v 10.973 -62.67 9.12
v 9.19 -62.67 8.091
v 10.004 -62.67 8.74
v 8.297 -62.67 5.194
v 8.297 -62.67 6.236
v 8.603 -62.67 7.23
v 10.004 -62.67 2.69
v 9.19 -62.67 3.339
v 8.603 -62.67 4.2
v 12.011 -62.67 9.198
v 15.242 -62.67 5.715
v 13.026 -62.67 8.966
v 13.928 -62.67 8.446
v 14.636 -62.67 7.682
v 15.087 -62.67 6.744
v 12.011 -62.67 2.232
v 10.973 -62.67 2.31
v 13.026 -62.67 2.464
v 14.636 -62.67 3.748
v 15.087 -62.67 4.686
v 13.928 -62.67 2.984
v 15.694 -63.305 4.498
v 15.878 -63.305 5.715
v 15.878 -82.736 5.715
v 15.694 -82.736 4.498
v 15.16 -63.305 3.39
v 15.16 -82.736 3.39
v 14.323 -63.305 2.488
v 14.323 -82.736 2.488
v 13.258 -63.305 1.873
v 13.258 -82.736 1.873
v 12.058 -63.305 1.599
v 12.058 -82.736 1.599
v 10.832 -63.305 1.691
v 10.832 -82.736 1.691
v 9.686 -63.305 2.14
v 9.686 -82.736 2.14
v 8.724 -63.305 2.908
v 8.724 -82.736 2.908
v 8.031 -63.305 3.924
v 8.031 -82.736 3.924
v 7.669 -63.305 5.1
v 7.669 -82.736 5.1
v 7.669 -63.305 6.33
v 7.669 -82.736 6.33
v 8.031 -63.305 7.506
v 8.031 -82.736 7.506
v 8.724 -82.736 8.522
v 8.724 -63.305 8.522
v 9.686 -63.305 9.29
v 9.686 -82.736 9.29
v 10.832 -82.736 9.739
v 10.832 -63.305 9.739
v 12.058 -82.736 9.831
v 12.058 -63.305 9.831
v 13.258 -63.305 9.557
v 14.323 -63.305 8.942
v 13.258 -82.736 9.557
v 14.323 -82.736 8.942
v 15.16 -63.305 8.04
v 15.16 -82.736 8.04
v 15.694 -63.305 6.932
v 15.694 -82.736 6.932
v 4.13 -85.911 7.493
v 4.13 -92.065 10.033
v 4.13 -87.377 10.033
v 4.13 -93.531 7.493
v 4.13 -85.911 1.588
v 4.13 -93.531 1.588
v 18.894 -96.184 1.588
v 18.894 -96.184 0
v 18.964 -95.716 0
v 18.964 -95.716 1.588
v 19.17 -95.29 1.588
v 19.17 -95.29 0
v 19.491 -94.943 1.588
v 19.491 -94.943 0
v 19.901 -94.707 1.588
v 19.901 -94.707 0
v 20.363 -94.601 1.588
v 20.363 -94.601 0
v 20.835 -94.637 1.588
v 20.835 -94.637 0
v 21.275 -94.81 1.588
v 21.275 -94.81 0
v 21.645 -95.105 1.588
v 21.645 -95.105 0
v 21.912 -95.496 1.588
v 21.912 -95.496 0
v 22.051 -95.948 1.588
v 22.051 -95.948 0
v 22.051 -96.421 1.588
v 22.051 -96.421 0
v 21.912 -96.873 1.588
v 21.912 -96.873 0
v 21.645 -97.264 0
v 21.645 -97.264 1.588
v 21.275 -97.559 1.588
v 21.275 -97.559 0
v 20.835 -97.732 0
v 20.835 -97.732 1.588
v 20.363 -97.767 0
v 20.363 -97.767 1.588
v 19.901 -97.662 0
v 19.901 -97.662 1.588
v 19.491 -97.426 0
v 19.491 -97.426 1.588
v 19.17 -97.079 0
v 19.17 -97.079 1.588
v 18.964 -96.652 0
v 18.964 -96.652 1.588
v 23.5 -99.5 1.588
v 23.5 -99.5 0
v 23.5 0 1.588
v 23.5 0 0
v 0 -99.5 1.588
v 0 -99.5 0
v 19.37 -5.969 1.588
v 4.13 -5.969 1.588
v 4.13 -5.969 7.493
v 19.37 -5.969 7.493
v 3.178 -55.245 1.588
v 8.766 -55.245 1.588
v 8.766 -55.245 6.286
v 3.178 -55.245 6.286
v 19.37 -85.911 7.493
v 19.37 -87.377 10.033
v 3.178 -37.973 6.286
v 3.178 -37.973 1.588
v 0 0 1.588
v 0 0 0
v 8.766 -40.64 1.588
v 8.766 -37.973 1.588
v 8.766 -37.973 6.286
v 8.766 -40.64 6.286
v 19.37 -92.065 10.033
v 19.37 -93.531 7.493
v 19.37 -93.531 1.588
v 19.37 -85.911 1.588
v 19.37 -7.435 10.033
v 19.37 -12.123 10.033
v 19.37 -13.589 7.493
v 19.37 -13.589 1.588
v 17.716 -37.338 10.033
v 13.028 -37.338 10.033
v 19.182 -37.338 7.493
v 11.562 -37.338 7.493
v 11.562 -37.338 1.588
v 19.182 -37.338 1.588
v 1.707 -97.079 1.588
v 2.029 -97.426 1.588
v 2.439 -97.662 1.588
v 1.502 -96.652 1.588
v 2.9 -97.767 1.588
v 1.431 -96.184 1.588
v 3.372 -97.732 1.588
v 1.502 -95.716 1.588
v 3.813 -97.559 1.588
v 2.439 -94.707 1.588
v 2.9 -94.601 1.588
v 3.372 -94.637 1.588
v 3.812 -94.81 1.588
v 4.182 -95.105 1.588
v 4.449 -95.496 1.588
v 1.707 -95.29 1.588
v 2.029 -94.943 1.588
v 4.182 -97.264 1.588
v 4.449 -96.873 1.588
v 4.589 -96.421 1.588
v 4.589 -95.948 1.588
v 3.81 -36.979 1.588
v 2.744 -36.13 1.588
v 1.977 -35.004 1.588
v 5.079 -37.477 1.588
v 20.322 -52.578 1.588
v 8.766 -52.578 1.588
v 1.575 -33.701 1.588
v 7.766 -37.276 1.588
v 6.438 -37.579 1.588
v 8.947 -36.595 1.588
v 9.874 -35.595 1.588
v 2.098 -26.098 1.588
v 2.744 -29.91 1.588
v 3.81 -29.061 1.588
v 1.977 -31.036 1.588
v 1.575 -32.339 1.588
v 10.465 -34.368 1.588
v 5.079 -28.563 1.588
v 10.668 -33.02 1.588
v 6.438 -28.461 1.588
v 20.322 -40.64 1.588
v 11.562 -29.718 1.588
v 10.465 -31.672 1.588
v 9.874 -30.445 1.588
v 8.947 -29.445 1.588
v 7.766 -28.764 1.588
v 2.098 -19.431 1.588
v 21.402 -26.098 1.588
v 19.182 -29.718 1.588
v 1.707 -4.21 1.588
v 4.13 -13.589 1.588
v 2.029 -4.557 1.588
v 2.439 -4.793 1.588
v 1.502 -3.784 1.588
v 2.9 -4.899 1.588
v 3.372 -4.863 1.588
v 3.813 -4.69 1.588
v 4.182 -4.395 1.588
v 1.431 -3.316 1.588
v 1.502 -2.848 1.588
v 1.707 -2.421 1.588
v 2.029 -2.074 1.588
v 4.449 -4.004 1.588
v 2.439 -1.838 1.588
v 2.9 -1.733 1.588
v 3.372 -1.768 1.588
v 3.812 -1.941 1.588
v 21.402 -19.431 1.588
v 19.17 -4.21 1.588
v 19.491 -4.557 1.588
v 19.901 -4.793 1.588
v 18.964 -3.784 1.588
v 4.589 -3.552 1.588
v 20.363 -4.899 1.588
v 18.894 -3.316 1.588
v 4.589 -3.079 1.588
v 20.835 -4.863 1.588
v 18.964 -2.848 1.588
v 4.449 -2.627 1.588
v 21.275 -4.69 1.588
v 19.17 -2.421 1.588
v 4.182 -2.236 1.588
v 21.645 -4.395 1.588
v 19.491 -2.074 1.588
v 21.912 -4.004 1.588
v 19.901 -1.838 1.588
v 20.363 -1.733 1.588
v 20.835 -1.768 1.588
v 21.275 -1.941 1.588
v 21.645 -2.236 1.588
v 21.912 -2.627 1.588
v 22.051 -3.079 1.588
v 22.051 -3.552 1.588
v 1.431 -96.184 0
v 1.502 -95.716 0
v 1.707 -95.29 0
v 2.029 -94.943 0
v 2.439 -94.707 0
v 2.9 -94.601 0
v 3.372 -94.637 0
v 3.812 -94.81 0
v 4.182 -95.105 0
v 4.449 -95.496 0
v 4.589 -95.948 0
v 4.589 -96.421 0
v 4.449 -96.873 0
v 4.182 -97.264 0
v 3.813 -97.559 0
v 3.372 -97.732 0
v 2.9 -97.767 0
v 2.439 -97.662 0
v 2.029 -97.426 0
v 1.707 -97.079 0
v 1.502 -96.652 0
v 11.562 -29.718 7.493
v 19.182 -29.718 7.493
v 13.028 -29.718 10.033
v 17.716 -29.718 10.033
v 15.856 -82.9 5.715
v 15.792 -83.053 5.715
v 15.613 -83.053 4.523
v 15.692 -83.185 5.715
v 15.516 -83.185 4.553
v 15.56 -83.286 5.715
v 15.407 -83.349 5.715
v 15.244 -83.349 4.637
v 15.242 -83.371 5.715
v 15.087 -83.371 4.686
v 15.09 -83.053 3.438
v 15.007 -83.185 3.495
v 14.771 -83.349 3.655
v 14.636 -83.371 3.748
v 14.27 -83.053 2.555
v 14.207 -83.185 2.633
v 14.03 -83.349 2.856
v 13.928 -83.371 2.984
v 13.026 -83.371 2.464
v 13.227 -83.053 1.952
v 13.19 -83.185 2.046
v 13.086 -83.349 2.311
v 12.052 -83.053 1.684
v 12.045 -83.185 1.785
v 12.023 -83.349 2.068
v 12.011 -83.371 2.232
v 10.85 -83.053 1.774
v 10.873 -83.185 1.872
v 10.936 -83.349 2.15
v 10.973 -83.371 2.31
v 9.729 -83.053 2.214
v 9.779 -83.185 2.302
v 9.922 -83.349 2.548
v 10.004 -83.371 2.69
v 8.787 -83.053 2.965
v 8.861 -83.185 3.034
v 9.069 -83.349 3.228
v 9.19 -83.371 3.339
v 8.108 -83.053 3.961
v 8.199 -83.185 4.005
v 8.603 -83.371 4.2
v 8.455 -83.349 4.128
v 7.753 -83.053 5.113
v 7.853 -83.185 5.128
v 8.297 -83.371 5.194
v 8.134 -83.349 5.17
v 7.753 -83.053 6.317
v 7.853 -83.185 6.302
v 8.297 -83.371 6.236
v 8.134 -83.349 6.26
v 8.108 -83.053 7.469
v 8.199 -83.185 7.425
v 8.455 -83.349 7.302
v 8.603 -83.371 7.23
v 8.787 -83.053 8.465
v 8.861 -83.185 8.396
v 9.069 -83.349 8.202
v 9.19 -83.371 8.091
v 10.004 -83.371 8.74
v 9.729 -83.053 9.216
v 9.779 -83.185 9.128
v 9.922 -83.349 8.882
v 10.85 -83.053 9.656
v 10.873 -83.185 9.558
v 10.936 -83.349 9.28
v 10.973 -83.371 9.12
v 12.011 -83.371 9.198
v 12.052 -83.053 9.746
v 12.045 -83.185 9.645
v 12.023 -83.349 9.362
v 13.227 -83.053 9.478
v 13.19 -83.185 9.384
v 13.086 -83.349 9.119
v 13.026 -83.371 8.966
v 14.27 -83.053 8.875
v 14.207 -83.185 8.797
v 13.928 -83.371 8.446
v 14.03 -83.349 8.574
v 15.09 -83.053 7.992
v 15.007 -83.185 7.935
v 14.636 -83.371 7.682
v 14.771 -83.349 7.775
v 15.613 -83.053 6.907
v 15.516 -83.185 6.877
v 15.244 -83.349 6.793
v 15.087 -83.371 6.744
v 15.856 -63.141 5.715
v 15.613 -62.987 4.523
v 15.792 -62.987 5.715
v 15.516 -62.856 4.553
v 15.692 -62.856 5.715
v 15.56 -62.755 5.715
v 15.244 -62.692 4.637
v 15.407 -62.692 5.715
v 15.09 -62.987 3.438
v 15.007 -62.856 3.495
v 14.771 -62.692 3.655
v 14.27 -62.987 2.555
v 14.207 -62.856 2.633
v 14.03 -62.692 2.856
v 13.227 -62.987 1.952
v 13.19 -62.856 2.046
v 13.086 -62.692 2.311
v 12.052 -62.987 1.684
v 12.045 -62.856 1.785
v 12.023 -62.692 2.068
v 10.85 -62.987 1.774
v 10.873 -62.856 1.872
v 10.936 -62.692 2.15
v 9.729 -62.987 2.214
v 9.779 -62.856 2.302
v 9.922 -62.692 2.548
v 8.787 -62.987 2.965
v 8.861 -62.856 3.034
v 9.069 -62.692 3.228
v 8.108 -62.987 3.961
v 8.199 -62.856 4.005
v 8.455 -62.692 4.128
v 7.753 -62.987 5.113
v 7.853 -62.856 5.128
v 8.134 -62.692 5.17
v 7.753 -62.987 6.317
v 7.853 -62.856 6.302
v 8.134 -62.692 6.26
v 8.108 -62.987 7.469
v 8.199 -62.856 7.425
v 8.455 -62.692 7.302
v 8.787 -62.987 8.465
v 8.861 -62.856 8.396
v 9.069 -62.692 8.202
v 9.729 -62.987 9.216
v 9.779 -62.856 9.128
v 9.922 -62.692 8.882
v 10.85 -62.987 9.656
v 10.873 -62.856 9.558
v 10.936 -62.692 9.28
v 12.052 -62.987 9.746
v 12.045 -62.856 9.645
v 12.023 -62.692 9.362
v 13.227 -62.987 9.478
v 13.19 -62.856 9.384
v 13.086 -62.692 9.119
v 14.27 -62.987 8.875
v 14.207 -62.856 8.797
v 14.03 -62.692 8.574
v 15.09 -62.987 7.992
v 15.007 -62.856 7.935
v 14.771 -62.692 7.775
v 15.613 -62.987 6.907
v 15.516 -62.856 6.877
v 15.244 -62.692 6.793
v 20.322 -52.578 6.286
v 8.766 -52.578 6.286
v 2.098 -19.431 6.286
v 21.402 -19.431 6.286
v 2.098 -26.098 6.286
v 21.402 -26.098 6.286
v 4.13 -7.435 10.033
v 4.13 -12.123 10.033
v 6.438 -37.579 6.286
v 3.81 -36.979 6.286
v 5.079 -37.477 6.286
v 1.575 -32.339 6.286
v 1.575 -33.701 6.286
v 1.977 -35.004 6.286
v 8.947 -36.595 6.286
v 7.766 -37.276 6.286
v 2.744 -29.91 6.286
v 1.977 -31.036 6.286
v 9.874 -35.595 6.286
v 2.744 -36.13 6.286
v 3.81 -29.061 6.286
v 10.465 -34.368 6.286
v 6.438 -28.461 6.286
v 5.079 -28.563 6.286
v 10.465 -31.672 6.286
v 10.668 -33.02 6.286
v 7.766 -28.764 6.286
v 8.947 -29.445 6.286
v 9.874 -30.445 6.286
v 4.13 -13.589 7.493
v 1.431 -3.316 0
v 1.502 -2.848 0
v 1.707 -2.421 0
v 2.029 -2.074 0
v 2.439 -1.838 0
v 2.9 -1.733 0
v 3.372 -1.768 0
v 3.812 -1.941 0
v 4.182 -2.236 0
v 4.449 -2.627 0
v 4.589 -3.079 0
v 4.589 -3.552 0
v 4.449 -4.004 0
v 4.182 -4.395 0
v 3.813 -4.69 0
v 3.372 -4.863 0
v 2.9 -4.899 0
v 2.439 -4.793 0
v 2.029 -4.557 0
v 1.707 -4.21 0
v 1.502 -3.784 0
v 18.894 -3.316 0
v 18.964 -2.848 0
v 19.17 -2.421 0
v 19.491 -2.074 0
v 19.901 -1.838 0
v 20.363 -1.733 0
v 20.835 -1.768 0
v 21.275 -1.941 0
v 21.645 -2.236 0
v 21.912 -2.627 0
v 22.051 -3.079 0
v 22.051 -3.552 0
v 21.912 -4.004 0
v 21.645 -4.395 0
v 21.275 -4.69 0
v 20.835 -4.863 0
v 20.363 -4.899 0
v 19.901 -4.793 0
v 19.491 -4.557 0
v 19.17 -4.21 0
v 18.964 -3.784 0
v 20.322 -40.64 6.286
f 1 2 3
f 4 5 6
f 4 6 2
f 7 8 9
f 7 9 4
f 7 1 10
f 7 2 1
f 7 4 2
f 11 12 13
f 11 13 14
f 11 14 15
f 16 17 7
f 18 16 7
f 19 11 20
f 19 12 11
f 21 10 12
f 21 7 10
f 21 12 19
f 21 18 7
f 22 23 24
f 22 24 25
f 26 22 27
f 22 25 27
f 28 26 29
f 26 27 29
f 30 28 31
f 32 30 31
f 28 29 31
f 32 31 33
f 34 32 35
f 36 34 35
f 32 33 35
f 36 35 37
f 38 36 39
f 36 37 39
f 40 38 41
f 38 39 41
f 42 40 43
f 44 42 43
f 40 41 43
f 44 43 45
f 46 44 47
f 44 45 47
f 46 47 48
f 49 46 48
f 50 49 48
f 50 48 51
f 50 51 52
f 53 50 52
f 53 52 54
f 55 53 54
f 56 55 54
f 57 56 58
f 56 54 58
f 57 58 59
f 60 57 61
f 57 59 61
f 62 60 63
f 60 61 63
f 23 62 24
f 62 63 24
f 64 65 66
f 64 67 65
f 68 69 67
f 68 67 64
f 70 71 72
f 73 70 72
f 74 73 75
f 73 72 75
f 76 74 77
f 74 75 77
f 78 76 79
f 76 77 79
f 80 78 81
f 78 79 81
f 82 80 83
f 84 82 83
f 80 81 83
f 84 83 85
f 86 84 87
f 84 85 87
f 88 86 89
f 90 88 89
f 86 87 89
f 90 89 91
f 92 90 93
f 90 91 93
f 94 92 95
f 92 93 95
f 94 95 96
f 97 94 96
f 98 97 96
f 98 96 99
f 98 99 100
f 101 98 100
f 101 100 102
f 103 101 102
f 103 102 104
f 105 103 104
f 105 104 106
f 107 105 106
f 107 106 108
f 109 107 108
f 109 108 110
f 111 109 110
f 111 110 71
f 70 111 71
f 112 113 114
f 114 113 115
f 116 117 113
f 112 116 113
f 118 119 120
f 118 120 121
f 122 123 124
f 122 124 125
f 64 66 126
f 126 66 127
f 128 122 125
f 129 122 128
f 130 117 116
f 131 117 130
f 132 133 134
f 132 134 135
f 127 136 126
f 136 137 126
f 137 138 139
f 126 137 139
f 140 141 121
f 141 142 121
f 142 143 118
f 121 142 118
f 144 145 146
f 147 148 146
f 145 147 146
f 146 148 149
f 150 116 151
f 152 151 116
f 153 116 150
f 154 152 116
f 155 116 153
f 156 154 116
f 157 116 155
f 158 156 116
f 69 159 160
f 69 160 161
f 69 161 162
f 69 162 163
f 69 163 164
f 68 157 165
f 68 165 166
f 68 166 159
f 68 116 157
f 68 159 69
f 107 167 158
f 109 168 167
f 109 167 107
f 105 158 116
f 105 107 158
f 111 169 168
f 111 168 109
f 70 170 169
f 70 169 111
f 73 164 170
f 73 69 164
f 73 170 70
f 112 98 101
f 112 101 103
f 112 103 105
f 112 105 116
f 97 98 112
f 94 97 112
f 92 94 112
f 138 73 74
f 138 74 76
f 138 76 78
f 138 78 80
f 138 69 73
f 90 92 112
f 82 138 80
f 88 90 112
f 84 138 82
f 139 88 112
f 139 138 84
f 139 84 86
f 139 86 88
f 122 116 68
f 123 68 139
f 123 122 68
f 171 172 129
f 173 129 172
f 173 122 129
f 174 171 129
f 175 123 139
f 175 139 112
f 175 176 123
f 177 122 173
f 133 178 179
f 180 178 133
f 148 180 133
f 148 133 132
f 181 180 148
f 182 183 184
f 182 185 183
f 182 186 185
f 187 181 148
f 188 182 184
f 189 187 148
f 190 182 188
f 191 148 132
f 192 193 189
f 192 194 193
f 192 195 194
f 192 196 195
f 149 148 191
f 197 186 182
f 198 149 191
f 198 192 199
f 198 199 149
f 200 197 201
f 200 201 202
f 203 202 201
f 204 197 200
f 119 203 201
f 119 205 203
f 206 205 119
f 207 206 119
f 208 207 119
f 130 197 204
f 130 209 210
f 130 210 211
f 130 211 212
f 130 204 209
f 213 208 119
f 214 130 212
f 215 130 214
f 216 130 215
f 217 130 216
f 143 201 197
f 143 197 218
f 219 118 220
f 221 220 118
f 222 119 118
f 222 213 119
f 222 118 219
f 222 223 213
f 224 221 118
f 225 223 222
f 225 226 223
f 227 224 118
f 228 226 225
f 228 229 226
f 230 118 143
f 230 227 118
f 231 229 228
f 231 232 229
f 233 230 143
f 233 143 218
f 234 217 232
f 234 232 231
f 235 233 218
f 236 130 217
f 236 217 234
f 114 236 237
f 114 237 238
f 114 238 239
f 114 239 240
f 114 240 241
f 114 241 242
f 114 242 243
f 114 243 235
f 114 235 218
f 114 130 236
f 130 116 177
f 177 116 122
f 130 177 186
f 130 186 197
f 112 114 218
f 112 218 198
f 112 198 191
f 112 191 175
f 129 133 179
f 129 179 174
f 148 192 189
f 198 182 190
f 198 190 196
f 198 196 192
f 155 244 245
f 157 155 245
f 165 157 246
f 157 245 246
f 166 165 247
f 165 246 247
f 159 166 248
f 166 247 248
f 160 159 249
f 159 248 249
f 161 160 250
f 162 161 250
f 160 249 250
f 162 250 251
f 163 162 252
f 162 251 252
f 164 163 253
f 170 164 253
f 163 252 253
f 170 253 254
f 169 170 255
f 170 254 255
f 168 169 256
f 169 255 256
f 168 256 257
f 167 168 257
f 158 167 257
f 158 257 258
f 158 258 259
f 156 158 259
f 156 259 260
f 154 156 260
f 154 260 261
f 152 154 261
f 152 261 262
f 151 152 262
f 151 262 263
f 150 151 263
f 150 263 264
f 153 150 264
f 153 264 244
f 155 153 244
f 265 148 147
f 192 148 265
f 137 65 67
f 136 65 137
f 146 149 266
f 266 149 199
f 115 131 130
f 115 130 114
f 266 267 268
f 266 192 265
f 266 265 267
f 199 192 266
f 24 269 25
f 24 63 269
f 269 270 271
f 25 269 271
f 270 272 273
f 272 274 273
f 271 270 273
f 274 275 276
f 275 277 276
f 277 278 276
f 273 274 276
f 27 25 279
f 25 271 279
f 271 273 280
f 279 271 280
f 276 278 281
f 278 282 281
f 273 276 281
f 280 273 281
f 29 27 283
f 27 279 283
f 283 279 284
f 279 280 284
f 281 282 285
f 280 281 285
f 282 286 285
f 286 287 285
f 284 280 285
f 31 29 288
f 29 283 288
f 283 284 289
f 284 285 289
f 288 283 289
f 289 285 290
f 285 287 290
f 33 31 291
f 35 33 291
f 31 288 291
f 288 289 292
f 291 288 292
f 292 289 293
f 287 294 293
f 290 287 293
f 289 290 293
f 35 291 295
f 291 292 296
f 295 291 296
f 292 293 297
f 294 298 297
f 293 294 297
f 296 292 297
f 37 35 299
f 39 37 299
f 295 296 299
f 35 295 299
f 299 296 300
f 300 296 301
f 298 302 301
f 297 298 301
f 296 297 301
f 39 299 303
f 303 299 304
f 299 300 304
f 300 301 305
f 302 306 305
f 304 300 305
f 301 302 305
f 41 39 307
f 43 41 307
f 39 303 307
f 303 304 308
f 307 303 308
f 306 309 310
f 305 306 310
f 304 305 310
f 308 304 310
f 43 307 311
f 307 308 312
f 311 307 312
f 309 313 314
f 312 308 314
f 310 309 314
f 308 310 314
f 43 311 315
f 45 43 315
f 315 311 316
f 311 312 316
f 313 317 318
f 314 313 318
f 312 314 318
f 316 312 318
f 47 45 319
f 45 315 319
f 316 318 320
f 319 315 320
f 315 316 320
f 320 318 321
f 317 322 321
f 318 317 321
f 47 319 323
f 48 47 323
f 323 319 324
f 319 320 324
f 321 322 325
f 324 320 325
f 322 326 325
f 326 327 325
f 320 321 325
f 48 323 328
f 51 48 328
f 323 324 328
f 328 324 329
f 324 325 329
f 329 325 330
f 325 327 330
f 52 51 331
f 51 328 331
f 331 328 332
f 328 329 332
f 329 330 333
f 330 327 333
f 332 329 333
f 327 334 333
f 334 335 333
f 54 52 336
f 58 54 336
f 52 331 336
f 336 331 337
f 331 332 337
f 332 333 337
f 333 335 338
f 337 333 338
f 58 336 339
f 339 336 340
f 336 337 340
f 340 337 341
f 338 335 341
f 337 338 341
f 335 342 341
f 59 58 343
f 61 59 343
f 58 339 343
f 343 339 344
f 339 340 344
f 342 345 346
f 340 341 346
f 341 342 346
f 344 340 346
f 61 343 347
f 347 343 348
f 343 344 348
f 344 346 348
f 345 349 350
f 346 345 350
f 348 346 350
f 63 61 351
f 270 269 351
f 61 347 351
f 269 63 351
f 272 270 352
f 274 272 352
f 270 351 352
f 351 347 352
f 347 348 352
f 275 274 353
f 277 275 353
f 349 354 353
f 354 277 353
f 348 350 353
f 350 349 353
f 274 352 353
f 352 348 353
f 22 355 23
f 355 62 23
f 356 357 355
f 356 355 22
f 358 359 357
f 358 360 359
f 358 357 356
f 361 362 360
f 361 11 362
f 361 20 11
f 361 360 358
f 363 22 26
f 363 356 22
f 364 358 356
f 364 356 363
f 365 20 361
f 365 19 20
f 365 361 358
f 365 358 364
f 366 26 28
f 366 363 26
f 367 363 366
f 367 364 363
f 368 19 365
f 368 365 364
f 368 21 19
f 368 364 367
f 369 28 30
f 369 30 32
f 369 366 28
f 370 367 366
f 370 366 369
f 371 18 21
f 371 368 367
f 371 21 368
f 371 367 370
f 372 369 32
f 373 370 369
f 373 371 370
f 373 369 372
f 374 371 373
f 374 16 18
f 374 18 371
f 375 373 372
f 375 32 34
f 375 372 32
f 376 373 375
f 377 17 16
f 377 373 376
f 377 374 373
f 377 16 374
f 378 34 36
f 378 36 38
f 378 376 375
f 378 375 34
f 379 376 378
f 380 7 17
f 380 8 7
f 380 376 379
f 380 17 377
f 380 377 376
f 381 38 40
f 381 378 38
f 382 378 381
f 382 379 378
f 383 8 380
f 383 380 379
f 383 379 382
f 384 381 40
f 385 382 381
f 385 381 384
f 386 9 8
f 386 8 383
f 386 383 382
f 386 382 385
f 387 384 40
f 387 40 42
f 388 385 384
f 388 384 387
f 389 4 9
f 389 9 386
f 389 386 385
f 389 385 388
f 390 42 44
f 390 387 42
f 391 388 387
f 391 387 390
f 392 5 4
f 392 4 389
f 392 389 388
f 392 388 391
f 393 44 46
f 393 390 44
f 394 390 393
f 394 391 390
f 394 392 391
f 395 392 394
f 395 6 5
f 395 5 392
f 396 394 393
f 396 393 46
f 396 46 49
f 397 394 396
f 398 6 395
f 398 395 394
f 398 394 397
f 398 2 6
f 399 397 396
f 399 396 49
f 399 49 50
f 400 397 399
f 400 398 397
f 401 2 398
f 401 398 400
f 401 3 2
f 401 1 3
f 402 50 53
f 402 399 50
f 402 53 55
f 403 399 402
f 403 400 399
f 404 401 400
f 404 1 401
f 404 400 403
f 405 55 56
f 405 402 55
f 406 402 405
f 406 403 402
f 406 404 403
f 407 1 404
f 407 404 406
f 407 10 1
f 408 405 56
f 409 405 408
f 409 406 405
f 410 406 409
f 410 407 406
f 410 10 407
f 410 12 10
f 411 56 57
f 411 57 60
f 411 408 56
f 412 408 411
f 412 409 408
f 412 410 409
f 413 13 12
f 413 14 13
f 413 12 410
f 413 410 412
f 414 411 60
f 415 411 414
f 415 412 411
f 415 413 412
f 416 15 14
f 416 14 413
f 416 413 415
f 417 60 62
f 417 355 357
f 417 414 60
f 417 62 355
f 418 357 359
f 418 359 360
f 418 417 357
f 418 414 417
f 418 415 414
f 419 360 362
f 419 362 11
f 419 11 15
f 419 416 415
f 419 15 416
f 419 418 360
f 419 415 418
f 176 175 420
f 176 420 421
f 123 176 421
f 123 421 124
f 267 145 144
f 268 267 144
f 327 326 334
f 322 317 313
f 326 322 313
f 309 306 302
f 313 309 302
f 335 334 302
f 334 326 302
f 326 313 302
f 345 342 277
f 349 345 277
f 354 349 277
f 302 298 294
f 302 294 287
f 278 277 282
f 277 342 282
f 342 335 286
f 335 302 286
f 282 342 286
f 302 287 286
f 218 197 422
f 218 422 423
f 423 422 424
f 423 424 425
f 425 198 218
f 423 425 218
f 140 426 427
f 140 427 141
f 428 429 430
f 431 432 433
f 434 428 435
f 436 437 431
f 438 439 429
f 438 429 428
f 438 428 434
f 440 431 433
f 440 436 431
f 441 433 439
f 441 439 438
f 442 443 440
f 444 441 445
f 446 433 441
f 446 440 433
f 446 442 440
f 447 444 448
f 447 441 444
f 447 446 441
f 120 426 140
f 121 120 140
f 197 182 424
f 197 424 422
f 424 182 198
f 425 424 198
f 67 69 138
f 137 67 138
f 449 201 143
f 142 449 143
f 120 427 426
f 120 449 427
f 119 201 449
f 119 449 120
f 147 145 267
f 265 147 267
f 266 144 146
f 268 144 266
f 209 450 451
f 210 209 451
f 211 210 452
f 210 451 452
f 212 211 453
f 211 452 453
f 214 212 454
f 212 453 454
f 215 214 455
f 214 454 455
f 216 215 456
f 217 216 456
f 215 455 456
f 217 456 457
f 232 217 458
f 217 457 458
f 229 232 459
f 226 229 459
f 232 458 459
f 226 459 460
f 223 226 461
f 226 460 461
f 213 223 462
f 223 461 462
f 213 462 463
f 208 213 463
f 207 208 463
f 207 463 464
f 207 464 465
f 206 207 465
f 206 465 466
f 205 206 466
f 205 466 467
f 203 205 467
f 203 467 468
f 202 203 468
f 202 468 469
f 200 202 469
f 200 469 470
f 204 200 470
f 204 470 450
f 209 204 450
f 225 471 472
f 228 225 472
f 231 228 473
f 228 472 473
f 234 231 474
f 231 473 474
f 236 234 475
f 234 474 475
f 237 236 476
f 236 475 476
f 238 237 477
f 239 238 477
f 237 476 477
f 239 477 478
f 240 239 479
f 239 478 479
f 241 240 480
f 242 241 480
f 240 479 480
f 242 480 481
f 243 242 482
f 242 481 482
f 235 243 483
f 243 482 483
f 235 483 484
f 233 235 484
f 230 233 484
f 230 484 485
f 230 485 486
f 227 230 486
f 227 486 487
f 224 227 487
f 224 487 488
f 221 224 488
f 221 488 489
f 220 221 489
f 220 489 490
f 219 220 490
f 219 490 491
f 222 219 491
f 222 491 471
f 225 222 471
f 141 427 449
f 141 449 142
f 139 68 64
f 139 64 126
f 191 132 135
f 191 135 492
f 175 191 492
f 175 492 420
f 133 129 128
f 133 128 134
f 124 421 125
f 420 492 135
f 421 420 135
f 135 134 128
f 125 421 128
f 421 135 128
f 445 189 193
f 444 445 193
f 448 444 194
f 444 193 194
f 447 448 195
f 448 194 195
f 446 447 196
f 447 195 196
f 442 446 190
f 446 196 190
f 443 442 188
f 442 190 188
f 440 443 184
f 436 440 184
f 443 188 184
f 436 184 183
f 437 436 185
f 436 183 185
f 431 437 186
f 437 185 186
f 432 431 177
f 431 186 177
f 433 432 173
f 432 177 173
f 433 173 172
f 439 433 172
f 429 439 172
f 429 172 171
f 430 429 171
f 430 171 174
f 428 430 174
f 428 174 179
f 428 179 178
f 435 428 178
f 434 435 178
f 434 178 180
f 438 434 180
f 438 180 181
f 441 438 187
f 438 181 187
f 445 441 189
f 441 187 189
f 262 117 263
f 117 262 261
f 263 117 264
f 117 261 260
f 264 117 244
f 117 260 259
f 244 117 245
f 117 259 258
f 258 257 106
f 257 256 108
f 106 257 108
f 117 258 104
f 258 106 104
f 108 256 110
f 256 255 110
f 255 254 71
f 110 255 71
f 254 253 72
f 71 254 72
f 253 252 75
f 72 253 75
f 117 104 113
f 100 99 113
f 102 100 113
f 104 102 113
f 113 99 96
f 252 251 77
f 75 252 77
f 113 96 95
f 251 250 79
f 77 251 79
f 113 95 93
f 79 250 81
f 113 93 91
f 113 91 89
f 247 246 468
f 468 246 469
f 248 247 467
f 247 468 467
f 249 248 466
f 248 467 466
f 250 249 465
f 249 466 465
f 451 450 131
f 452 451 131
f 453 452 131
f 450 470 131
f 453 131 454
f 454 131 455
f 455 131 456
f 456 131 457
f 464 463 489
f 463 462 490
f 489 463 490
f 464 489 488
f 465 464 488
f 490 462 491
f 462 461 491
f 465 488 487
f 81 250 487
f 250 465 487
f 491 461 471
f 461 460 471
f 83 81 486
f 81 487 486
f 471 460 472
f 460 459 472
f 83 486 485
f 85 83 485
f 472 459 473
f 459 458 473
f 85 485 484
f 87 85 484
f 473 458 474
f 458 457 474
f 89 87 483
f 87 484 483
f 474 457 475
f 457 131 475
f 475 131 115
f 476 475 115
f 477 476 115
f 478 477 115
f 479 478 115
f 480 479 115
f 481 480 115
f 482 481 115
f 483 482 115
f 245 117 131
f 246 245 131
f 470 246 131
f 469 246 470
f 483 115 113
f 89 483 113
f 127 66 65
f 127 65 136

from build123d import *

# Parameters (mm, degrees)
SKETCH1_W             = 23.5
SKETCH1_H             = 99.5
BOSS_EXTRUDE1_DEPTH   = 1.5875
SKETCH2_R             = 1.5875
CUT_EXTRUDE1_DEPTH    = 2.5875
SKETCH5_W             = 15.24
SKETCH5_H             = 7.62
SKETCH5_W_2           = 7.62
BOSS_EXTRUDE2_DEPTH   = 8.4455
CHAMFER1_SIZE         = 2.54
CHAMFER1_SIZE2        = 1.466469684
CHAMFER1_PART_2_SIZE  = 2.54
CHAMFER1_PART_2_SIZE2 = 1.466469684
CHAMFER1_PART_3_SIZE  = 2.54
CHAMFER1_PART_3_SIZE2 = 1.466469684
CHAMFER1_PART_4_SIZE  = 2.54
CHAMFER1_PART_4_SIZE2 = 1.466469684
CHAMFER1_PART_5_SIZE  = 2.54
CHAMFER1_PART_5_SIZE2 = 1.466469684
CHAMFER1_PART_6_SIZE  = 2.54
CHAMFER1_PART_6_SIZE2 = 1.466469684
SKETCH6_R             = 4.1275
BOSS_EXTRUDE3_DEPTH   = 20.701
FILLET1_R             = 0.635
SKETCH7_R             = 4.572
SKETCH7_W             = 19.304
SKETCH7_H             = 6.6675
BOSS_EXTRUDE4_DEPTH   = 4.699


with BuildPart() as part:
    # Sketch1 → Boss-Extrude1 (new body)
    with BuildSketch(Plane.XY):
        with Locations((11.75, -49.75)):
            Rectangle(SKETCH1_W, SKETCH1_H)
    extrude(amount=BOSS_EXTRUDE1_DEPTH)

    # Sketch2 → Cut-Extrude1 (cut, through all)
    with BuildSketch(Plane(origin=(0, 0, 0), x_dir=(-1, 0, 0), z_dir=(0, 0, -1))):
        with Locations((-20.48125, -3.315625)):
            Circle(SKETCH2_R)
        with Locations((-3.01875, -3.315625)):
            Circle(SKETCH2_R)
        with Locations((-3.01875, -96.184375)):
            Circle(SKETCH2_R)
        with Locations((-20.48125, -96.184375)):
            Circle(SKETCH2_R)
    extrude(amount=-CUT_EXTRUDE1_DEPTH, mode=Mode.SUBTRACT)

    # Sketch5 → Boss-Extrude2 (add)
    with BuildSketch(Plane.XY.offset(1.5875)):
        with Locations((11.75, -9.779)):
            Rectangle(SKETCH5_W, SKETCH5_H)
        with Locations((15.372, -33.528)):
            Rectangle(SKETCH5_W_2, SKETCH5_H)
        with Locations((11.75, -89.721)):
            Rectangle(SKETCH5_W, SKETCH5_H)
    extrude(amount=BOSS_EXTRUDE2_DEPTH)

    # Chamfer1
    chamfer1_edges = [part.edges().sort_by_distance(p)[0] for p in [
        (11.75, -13.589, 10.033),
    ]]
    chamfer1_side = [part.faces().sort_by_distance(p)[0] for p in [
        (11.75, -13.589, 5.81025),
    ]]
    chamfer(chamfer1_edges, length=CHAMFER1_SIZE, length2=CHAMFER1_SIZE2, reference=chamfer1_side[0])

    # Chamfer1 part 2
    chamfer1_part_2_edges = [part.edges().sort_by_distance(p)[0] for p in [
        (11.75, -5.969, 10.033),
    ]]
    chamfer1_part_2_side = [part.faces().sort_by_distance(p)[0] for p in [
        (11.75, -5.969, 5.81025),
    ]]
    chamfer(chamfer1_part_2_edges, length=CHAMFER1_PART_2_SIZE, length2=CHAMFER1_PART_2_SIZE2, reference=chamfer1_part_2_side[0])

    # Chamfer1 part 3
    chamfer1_part_3_edges = [part.edges().sort_by_distance(p)[0] for p in [
        (11.562, -33.528, 10.033),
    ]]
    chamfer1_part_3_side = [part.faces().sort_by_distance(p)[0] for p in [
        (11.562, -33.528, 5.81025),
    ]]
    chamfer(chamfer1_part_3_edges, length=CHAMFER1_PART_3_SIZE, length2=CHAMFER1_PART_3_SIZE2, reference=chamfer1_part_3_side[0])

    # Chamfer1 part 4
    chamfer1_part_4_edges = [part.edges().sort_by_distance(p)[0] for p in [
        (19.182, -33.528, 10.033),
    ]]
    chamfer1_part_4_side = [part.faces().sort_by_distance(p)[0] for p in [
        (19.182, -33.528, 5.81025),
    ]]
    chamfer(chamfer1_part_4_edges, length=CHAMFER1_PART_4_SIZE, length2=CHAMFER1_PART_4_SIZE2, reference=chamfer1_part_4_side[0])

    # Chamfer1 part 5
    chamfer1_part_5_edges = [part.edges().sort_by_distance(p)[0] for p in [
        (11.75, -93.531, 10.033),
    ]]
    chamfer1_part_5_side = [part.faces().sort_by_distance(p)[0] for p in [
        (11.75, -93.531, 5.81025),
    ]]
    chamfer(chamfer1_part_5_edges, length=CHAMFER1_PART_5_SIZE, length2=CHAMFER1_PART_5_SIZE2, reference=chamfer1_part_5_side[0])

    # Chamfer1 part 6
    chamfer1_part_6_edges = [part.edges().sort_by_distance(p)[0] for p in [
        (11.75, -85.911, 10.033),
    ]]
    chamfer1_part_6_side = [part.faces().sort_by_distance(p)[0] for p in [
        (11.75, -85.911, 5.81025),
    ]]
    chamfer(chamfer1_part_6_edges, length=CHAMFER1_PART_6_SIZE, length2=CHAMFER1_PART_6_SIZE2, reference=chamfer1_part_6_side[0])

    # Sketch7 → Boss-Extrude4 (add)
    with BuildSketch(Plane.XY.offset(1.5875)):
        with Locations((6.096, -33.02)):
            Circle(SKETCH7_R)
        with Locations((11.75, -22.76475)):
            Rectangle(SKETCH7_W, SKETCH7_H)
        Polygon((8.7655, -52.578), (8.7655, -55.245), (3.1775, -55.245), (3.1775, -37.973), (8.7655, -37.973), (8.7655, -40.64), (20.3225, -40.64), (20.3225, -52.578), align=None)
    extrude(amount=BOSS_EXTRUDE4_DEPTH)


with BuildPart() as body_2:
    # Sketch6 → Boss-Extrude3 (new body)
    with BuildSketch(Plane(origin=(0, -83.371, 0), x_dir=(1, 0, 0), z_dir=(0, 1, 0))):
        with Locations((11.75, -5.715)):
            Circle(SKETCH6_R)
    extrude(amount=BOSS_EXTRUDE3_DEPTH)

    # Fillet1
    fillet1_edges = [body_2.edges().sort_by_distance(p)[0] for p in [
        (7.6225, -83.371, 5.715),
        (7.6225, -62.67, 5.715),
    ]]
    fillet(fillet1_edges, radius=FILLET1_R)


solid = Compound([part.part, body_2.part])
